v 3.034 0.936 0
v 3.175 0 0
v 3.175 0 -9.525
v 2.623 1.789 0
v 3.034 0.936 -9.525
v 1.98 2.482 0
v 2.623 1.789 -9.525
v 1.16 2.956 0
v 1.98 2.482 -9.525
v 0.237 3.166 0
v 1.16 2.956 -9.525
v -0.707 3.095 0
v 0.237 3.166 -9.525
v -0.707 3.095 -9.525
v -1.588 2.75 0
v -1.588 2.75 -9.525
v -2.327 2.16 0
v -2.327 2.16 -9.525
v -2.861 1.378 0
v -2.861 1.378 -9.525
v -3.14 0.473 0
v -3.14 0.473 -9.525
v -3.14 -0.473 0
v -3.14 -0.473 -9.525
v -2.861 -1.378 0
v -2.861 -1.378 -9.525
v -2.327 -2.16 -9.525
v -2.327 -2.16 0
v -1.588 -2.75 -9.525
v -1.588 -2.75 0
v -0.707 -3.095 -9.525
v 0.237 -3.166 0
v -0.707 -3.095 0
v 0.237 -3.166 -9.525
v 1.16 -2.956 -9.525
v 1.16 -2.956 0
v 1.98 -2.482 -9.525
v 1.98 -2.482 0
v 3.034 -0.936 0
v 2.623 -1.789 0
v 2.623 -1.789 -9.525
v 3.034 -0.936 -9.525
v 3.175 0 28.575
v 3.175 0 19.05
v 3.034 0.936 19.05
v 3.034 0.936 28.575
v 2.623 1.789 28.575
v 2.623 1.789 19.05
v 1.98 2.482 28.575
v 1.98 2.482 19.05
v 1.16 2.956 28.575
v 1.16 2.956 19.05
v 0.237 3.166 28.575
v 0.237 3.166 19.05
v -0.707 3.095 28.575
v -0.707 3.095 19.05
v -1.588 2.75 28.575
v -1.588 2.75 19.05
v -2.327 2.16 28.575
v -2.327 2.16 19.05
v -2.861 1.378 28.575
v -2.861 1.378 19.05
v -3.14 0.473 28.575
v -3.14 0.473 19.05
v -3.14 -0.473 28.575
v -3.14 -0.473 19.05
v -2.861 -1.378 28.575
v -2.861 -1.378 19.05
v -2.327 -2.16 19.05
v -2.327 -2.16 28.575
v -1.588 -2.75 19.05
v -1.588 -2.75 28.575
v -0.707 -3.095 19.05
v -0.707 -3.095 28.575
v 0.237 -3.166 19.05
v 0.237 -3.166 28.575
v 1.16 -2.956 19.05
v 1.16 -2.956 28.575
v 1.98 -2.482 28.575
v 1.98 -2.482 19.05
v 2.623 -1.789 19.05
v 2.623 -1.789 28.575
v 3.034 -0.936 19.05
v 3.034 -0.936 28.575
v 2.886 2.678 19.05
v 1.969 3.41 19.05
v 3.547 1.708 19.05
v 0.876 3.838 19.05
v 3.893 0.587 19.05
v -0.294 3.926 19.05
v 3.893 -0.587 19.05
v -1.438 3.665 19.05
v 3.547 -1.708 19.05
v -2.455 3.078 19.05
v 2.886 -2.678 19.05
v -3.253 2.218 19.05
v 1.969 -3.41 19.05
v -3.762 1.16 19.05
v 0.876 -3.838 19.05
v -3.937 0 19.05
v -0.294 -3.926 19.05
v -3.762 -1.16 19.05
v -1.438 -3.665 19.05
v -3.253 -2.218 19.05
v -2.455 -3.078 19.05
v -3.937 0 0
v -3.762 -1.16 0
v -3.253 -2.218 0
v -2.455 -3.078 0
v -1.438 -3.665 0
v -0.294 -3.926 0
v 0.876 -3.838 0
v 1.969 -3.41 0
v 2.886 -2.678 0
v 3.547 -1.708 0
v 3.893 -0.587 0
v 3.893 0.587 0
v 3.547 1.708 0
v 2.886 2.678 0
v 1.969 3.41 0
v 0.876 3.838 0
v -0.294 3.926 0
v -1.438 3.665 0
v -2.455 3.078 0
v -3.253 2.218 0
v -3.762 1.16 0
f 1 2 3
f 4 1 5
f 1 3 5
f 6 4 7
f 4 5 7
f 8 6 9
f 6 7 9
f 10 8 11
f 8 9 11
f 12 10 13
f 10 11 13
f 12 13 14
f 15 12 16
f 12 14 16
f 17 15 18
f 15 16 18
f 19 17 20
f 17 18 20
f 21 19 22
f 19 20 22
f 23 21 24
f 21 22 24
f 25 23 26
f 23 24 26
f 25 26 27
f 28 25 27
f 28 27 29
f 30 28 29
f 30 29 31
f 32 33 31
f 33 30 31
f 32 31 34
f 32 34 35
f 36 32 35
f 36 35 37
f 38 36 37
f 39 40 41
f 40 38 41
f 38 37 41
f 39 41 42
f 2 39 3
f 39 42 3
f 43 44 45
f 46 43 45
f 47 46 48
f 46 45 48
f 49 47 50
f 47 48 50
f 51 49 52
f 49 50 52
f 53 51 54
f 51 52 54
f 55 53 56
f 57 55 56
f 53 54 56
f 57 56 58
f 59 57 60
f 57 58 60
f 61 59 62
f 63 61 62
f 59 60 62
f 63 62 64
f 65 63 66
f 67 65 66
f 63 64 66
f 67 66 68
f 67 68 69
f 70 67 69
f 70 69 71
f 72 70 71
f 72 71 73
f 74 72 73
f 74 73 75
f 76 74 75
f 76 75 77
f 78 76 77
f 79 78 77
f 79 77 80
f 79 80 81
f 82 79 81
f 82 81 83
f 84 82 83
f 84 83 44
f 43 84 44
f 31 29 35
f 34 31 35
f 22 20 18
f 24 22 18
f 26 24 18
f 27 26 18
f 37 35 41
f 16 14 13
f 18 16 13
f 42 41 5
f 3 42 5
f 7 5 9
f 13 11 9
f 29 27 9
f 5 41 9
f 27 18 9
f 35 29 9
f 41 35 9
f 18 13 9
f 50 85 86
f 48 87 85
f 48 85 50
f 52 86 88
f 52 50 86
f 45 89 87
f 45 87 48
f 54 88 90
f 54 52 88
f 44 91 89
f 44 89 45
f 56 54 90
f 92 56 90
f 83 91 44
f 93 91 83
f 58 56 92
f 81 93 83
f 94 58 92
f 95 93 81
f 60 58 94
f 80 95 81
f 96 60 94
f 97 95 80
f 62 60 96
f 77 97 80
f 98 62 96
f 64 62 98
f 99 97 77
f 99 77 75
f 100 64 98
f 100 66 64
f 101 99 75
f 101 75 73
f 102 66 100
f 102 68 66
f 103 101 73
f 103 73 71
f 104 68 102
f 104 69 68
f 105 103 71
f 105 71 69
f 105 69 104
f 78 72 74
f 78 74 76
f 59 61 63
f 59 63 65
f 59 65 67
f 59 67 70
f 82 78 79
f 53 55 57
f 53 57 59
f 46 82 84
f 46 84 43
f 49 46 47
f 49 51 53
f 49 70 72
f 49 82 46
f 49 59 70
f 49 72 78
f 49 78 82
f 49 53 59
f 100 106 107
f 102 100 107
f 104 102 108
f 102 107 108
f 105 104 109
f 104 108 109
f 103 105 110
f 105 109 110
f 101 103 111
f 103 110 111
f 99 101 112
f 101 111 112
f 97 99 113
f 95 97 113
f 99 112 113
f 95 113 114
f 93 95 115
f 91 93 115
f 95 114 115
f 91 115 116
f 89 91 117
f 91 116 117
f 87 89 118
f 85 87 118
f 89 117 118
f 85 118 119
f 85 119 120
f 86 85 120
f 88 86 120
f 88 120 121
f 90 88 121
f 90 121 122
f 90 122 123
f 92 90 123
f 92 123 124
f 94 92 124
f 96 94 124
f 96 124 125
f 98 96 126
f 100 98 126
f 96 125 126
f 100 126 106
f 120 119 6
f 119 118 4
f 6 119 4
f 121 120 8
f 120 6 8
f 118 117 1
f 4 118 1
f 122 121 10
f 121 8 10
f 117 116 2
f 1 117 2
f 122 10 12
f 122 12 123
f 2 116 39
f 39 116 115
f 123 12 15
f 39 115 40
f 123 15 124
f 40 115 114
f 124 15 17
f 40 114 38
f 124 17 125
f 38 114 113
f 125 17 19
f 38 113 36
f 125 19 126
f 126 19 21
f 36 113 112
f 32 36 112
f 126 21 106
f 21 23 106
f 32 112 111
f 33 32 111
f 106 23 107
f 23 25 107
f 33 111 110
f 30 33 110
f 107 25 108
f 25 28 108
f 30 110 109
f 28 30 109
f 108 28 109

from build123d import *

# Parameters (mm, degrees)
SKETCH1_R                = 3.937
BOSS_EXTRUDE2_DEPTH      = 19.05
BOSS_EXTRUDE3_DEPTH      = 9.525
BOSS_EXTRUDE3_DEPTH_BACK = 28.575
SKETCH3_R                = 3.175


with BuildPart() as part:
    # Sketch1 → Boss-Extrude2 (new body)
    with BuildSketch(Plane.XY):
        with Locations(Location((0, 0, 0), (0, 0, 180))):
            Circle(SKETCH1_R)
    extrude(amount=BOSS_EXTRUDE2_DEPTH)

    # Sketch3 → Boss-Extrude3 (add, two sides: drawn at the far end of the back side and taken through both)
    with BuildSketch(Plane.XY.offset(19.05).offset(-BOSS_EXTRUDE3_DEPTH_BACK)):
        Circle(SKETCH3_R)
    extrude(amount=BOSS_EXTRUDE3_DEPTH + BOSS_EXTRUDE3_DEPTH_BACK)


solid = part.part
